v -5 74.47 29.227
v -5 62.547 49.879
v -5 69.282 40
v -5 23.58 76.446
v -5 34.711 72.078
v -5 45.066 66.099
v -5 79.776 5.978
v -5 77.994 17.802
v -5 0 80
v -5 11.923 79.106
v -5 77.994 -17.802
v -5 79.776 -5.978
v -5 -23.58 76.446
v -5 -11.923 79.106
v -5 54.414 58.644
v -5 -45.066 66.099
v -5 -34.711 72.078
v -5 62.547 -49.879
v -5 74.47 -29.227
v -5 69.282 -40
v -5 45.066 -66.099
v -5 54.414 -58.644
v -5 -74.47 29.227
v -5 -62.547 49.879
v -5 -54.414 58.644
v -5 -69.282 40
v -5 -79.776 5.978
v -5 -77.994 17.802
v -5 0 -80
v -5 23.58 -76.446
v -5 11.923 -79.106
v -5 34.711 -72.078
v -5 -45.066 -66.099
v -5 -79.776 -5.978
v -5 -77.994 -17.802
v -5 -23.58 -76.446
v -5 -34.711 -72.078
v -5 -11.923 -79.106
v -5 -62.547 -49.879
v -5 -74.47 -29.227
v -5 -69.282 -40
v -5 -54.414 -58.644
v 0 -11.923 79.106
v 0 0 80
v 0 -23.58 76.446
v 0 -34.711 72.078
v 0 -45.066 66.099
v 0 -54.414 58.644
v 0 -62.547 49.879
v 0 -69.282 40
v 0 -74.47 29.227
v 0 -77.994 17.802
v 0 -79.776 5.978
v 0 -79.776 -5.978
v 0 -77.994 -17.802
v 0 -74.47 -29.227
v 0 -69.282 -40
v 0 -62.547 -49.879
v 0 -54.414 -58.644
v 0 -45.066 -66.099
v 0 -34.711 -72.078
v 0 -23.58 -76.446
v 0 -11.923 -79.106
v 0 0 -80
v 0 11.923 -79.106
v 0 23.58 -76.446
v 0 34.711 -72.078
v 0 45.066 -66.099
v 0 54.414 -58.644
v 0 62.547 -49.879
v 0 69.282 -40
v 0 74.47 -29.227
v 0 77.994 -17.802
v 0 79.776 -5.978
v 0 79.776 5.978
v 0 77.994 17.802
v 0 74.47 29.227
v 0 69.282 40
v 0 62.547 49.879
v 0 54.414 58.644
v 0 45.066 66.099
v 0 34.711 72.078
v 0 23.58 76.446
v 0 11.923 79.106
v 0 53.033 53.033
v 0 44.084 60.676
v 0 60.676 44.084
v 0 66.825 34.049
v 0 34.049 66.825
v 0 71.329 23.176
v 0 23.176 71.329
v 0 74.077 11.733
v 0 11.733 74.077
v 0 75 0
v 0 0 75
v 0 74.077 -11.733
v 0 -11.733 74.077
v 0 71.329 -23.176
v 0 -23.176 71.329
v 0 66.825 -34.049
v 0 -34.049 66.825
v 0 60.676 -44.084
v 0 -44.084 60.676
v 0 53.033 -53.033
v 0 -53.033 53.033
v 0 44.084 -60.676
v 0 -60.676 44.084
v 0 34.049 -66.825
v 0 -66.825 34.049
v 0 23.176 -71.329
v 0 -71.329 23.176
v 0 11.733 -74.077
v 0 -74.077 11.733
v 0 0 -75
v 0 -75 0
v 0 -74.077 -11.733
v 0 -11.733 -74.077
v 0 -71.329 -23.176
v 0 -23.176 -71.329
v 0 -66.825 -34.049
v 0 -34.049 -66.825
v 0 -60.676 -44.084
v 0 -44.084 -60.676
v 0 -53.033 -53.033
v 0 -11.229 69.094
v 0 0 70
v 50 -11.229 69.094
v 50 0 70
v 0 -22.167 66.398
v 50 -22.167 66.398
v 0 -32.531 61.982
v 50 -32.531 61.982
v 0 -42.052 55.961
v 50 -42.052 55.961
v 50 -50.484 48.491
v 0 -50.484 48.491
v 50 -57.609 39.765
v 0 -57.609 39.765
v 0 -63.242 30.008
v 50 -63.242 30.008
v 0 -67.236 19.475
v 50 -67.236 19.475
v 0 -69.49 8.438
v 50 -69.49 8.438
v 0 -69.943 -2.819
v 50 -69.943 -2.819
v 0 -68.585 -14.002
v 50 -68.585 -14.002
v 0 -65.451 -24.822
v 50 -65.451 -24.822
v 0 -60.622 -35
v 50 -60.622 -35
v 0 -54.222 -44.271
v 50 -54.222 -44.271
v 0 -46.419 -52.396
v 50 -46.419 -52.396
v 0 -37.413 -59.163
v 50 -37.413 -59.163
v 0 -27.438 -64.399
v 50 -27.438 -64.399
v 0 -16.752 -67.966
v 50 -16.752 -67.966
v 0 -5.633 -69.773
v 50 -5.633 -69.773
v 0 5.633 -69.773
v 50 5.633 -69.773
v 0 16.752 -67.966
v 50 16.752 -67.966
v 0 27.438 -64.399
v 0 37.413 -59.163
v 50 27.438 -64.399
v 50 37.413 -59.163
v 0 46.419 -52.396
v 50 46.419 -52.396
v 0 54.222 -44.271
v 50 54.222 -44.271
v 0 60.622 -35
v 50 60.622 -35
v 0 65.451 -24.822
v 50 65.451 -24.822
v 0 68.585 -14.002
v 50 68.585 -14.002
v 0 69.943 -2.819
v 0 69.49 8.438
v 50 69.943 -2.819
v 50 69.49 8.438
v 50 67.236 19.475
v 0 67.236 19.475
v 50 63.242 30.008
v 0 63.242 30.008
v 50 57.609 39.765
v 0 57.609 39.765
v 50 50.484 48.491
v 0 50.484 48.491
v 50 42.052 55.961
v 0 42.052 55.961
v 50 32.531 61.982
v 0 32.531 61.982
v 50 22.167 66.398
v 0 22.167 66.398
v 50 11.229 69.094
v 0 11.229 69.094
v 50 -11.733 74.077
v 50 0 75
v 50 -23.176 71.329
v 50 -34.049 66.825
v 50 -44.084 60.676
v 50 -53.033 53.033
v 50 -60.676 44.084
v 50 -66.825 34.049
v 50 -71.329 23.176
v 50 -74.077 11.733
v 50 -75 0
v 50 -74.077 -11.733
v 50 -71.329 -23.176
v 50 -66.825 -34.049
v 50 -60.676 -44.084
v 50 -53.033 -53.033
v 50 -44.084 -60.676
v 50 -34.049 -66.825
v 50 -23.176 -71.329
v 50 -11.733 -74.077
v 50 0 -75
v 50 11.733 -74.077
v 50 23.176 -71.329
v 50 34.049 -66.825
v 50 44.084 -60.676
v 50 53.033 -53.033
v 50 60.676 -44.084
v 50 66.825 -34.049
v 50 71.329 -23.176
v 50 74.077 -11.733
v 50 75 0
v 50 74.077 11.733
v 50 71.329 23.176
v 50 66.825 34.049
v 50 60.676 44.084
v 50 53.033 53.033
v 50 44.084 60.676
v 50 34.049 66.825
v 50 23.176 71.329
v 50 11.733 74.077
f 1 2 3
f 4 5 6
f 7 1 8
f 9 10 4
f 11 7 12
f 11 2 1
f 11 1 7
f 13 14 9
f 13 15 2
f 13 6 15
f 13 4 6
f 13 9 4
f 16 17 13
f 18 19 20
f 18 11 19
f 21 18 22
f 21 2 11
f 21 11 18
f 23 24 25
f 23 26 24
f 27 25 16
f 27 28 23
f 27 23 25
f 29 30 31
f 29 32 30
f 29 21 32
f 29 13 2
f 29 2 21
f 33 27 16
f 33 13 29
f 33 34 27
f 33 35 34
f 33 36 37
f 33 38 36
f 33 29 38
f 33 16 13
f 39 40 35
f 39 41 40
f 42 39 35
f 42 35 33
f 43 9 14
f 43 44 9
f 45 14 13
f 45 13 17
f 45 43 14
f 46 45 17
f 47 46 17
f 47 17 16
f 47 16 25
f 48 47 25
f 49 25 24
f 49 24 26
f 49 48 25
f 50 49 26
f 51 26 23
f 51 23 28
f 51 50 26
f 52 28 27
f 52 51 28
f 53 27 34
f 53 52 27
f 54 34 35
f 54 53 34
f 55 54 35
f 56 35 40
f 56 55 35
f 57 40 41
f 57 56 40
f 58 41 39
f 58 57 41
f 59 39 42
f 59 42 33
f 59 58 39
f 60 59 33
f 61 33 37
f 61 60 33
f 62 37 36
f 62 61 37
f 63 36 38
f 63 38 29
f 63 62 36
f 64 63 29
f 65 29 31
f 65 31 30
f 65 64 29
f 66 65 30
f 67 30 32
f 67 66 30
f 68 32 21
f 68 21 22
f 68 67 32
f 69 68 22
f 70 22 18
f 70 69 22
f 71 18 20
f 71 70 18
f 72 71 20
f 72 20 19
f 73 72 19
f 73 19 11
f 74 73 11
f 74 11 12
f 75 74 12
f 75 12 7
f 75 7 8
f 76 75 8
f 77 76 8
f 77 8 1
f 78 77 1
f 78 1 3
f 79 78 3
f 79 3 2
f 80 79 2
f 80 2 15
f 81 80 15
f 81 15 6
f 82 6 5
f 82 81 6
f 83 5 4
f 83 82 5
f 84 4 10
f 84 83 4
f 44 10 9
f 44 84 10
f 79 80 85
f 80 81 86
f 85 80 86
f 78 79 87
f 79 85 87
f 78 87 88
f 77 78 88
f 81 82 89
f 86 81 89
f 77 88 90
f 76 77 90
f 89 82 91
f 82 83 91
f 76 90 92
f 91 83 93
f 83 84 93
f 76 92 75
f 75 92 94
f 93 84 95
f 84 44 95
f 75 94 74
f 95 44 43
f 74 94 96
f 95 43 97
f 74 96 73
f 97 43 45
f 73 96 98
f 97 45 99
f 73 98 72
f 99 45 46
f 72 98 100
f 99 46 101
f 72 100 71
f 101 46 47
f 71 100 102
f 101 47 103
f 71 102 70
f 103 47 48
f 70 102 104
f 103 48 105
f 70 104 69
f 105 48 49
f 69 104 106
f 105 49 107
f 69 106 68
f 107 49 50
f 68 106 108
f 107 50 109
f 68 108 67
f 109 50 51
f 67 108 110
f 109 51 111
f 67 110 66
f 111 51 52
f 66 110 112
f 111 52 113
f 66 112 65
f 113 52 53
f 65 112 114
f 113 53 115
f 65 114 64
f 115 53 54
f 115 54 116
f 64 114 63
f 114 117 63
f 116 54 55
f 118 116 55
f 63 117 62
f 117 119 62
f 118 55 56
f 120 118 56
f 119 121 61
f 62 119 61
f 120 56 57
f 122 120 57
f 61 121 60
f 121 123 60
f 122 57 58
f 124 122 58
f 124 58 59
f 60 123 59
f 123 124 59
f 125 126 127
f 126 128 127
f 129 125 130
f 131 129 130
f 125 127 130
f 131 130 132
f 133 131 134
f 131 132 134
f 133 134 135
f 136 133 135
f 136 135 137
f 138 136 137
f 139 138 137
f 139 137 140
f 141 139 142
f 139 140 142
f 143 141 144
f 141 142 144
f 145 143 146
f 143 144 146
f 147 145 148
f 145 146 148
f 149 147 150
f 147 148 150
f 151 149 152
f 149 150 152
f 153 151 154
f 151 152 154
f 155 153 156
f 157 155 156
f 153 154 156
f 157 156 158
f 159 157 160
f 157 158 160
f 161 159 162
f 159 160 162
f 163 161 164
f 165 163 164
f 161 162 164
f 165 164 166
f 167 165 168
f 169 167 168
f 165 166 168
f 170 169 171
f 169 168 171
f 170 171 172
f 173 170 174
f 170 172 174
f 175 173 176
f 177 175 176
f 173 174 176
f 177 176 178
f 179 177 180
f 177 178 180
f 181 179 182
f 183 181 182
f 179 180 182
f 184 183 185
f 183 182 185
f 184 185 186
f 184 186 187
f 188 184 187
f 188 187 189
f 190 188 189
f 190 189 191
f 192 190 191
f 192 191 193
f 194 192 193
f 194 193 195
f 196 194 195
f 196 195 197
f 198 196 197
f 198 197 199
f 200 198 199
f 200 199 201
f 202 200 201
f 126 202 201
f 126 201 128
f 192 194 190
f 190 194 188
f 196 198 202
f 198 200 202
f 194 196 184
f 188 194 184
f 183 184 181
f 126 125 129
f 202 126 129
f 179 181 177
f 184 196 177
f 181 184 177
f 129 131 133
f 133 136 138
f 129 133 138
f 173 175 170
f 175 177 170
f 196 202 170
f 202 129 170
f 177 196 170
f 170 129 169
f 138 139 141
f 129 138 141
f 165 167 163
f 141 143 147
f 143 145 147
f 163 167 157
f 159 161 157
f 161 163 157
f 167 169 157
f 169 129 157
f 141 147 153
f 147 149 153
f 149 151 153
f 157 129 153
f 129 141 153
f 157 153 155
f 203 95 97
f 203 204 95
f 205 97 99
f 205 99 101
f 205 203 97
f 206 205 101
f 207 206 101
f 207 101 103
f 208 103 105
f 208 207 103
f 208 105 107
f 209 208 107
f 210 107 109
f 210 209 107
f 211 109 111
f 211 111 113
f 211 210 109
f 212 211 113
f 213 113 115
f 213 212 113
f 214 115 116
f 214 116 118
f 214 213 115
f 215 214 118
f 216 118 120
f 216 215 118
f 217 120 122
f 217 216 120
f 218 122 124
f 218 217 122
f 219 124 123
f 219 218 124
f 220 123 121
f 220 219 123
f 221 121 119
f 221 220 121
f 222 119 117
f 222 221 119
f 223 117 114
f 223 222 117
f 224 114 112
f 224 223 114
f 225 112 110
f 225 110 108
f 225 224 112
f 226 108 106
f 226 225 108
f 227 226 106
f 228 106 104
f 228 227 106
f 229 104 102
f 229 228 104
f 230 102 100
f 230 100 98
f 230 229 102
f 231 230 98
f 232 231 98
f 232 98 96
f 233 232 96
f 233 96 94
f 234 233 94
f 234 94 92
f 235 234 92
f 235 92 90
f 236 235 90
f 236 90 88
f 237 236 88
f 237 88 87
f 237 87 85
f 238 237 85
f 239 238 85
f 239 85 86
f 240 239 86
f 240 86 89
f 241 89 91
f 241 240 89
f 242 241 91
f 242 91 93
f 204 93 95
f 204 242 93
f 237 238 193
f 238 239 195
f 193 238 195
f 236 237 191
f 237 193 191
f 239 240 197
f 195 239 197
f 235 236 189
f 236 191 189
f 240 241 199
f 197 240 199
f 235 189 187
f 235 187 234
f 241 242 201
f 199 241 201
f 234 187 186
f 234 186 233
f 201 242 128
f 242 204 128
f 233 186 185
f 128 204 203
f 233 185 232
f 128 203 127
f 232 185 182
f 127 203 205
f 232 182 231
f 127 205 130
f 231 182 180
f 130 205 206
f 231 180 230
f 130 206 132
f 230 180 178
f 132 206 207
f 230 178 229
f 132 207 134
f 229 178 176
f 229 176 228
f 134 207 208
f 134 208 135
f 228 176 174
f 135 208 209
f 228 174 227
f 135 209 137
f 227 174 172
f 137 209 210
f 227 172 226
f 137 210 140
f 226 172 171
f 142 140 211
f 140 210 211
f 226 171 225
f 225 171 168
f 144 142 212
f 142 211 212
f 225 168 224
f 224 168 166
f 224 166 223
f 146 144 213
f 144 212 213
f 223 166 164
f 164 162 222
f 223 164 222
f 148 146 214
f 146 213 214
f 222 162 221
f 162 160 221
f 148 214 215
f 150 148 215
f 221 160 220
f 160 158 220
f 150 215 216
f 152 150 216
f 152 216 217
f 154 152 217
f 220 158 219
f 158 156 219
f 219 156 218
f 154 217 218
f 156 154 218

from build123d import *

# Parameters (mm, degrees)
SKIZZE1_W   = 5
SKIZZE1_H   = 80
SKIZZE1_W_2 = 50
SKIZZE1_H_2 = 5


with BuildPart() as part:
    # Skizze1 → Rotation1 (revolve)
    with BuildSketch(Plane.XY, mode=Mode.PRIVATE) as rotation1_sk:
        with Locations((-2.5, 40)):
            Rectangle(SKIZZE1_W, SKIZZE1_H)
        with Locations((25, 72.5)):
            Rectangle(SKIZZE1_W_2, SKIZZE1_H_2)
    revolve(rotation1_sk.sketch.rotate(Axis((0, 0, 0), (1, 0, 0)), 90), axis=Axis((0, 0, 0), (1, 0, 0)))


solid = part.part
